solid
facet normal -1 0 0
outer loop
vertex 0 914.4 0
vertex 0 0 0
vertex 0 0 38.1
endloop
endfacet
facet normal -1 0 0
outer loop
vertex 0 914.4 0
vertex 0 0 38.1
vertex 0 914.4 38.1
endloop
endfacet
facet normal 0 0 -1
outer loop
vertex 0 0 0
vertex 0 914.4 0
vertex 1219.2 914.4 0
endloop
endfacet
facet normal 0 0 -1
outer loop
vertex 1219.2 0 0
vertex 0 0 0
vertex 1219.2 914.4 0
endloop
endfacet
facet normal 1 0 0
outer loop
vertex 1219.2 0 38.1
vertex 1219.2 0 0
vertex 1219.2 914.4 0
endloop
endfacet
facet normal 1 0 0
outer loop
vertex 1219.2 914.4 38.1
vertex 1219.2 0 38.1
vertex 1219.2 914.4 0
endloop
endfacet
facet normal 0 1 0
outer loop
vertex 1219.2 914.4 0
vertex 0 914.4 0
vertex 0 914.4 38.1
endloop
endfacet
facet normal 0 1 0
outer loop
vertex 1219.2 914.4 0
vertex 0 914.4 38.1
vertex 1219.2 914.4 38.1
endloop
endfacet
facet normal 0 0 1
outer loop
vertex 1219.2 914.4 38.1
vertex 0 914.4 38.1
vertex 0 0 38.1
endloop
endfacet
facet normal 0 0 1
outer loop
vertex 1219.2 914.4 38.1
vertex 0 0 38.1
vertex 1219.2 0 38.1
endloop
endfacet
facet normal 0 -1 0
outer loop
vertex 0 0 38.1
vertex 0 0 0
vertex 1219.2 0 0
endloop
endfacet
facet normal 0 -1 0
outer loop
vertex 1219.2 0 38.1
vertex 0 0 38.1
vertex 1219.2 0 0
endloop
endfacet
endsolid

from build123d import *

# Parameters (mm, degrees)
F0_W     = 1828.8
F0_H     = 88.9
F1_DEPTH = 38.1
F3_W     = 1219.2
F3_H     = 914.4
F4_DEPTH = 38.1


with BuildPart() as f1:
    # F0 (on Top) → F1 (new body)
    with BuildSketch(Plane.XY):
        with Locations((914.4, -44.45)):
            Rectangle(F0_W, F0_H)
    extrude(amount=F1_DEPTH)


with BuildPart() as f4:
    # F3 (on Top) → F4 (new body)
    with BuildSketch(Plane.XY):
        with Locations((609.6, 457.2)):
            Rectangle(F3_W, F3_H)
    extrude(amount=F4_DEPTH)


solid = f4.part
